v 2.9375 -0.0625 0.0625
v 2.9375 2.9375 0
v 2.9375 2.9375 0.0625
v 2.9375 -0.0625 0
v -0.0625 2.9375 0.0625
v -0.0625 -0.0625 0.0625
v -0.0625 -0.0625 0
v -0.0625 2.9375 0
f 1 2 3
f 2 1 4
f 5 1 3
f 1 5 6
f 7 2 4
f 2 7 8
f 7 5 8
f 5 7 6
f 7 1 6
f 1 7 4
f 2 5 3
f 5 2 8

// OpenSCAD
// element20.scad — straight double-speed belt tile (two blue arrows)
// Units: inches

straight   = true;
left_turn  = false;
right_turn = false;

plate_w = 2 + 7/8;
plate_d = 2 + 7/8;
plate_h = 1/16;
frame_w = 1/16;

belt_w    = 1.75;
belt_half = belt_w / 2;

hole_d = 3/32;
hole_r = hole_d / 2;

roller_count  = 13;
roller_h_size = 3/16;
roller_r      = roller_h_size / 2;
roller_inset  = plate_w / 20;
roller_x_lo   = 2 * roller_inset;
roller_x_hi   = plate_w - 2 * roller_inset;
roller_y_step = (plate_w - 2 * roller_inset) / 12;

b_L = plate_w / 2 - belt_half;
b_R = plate_w / 2 + belt_half;
nub = roller_x_hi - b_R;

arrow_w       = belt_w * 0.75;
arrow_shaft_w = arrow_w * 0.4;
arrow_head_h  = arrow_w / 2;
arrow_gap     = 1/8;
arrow_h       = (plate_d * 3/4 - arrow_gap) / 2;
arrow_shaft_h = arrow_h - arrow_head_h;
arrow_outline = 1/8;

arrow_tip_y   = 3 * plate_d / 20 + 1/4 + 7 * plate_d / 10;
arrow2_y      = arrow_tip_y - arrow_h;
arrow1_y      = arrow2_y - arrow_gap - arrow_h;

module rivet_holes() {
    spacing_x = plate_w / 10;
    spacing_y = plate_d / 10;
    inset_x   = spacing_x / 2;
    inset_y   = spacing_y / 2;
    for (i = [0:9]) {
        translate([inset_x,           inset_y + i * spacing_y, -1])
            cylinder(h = plate_h + 2, r = hole_r, $fn = 20);
        translate([plate_w - inset_x, inset_y + i * spacing_y, -1])
            cylinder(h = plate_h + 2, r = hole_r, $fn = 20);
        if (inset_x + i * spacing_x <= roller_x_lo + roller_r - hole_r ||
            inset_x + i * spacing_x >= roller_x_hi - roller_r + hole_r) {
            translate([inset_x + i * spacing_x, inset_y,           -1])
                cylinder(h = plate_h + 2, r = hole_r, $fn = 20);
            translate([inset_x + i * spacing_x, plate_d - inset_y, -1])
                cylinder(h = plate_h + 2, r = hole_r, $fn = 20);
        }
    }
}

module frame_with_id(colors = []) {
    id_cover = plate_h / 8;
    region_w = (plate_w + 2 * frame_w) / 6;
    mark_h   = plate_h - id_cover;

    color("black")
    difference() {
        translate([-frame_w, -frame_w, 0])
            cube([plate_w + 2 * frame_w, plate_d + 2 * frame_w, plate_h]);
        translate([0, 0, -0.001])
            cube([plate_w, plate_d, plate_h + 0.002]);
        translate([-frame_w, plate_d, -0.001])
            cube([plate_w + 2 * frame_w, frame_w + 0.002, plate_h + 0.002]);
    }

    for (i = [0:5]) {
        c = (colors[i] != undef) ? colors[i] : "black";
        color(c)
        translate([-frame_w + i * region_w, plate_d, 0])
            cube([region_w, frame_w, mark_h]);
        color("black")
        translate([-frame_w + i * region_w, plate_d, mark_h])
            cube([region_w, frame_w, id_cover]);
    }
}

module belt_cutout() {
    translate([(plate_w - belt_w) / 2, -0.001, -0.001])
        cube([belt_w, plate_d + 0.002, plate_h + 0.002]);
}

module roller_slots() {
    for (i = [0:roller_count - 1]) {
        cy = roller_inset + i * roller_y_step;
        translate([0, 0, -0.001])
        hull() {
            translate([roller_x_lo + roller_r, cy, 0])
                cylinder(h = plate_h + 0.002, r = roller_r, $fn = 20);
            translate([roller_x_hi - roller_r, cy, 0])
                cylinder(h = plate_h + 0.002, r = roller_r, $fn = 20);
        }
    }
}

module plate() {
    difference() {
        color("darkgray")
            cube([plate_w, plate_d, plate_h]);
        rivet_holes();
        roller_slots();
        belt_cutout();
    }
}

module rollers() {
    color("blue")
    difference() {
        for (i = [0:roller_count - 1]) {
            cy = roller_inset + i * roller_y_step;
            hull() {
                translate([roller_x_lo + roller_r, cy, 0])
                    cylinder(h = plate_h, r = roller_r, $fn = 20);
                translate([roller_x_hi - roller_r, cy, 0])
                    cylinder(h = plate_h, r = roller_r, $fn = 20);
            }
        }
        belt_cutout();
    }
}

module rivets() {
    spacing_x = plate_w / 10;
    spacing_y = plate_d / 10;
    inset_x   = spacing_x / 2;
    inset_y   = spacing_y / 2;
    color("lightgray") {
        for (i = [0:9]) {
            translate([inset_x,           inset_y + i * spacing_y, 0])
                cylinder(h = plate_h, r = hole_r, $fn = 20);
            translate([plate_w - inset_x, inset_y + i * spacing_y, 0])
                cylinder(h = plate_h, r = hole_r, $fn = 20);
            if (inset_x + i * spacing_x <= roller_x_lo + roller_r - hole_r ||
            inset_x + i * spacing_x >= roller_x_hi - roller_r + hole_r) {
                translate([inset_x + i * spacing_x, inset_y,           0])
                    cylinder(h = plate_h, r = hole_r, $fn = 20);
                translate([inset_x + i * spacing_x, plate_d - inset_y, 0])
                    cylinder(h = plate_h, r = hole_r, $fn = 20);
            }
        }
    }
}

module arrow_2d() {
    polygon([
        [-arrow_shaft_w / 2, 0],
        [ arrow_shaft_w / 2, 0],
        [ arrow_shaft_w / 2, arrow_shaft_h],
        [ arrow_w / 2,       arrow_shaft_h],
        [ 0,                 arrow_h],
        [-arrow_w / 2,       arrow_shaft_h],
        [-arrow_shaft_w / 2, arrow_shaft_h]
    ]);
}

module arrows() {
    color("blue")
    for (ay = [arrow1_y, arrow2_y])
        translate([plate_w / 2, ay, 0])
        linear_extrude(plate_h)
        difference() {
            arrow_2d();
            offset(delta = -arrow_outline) arrow_2d();
        }
}

module belt() {
    color("black")
    difference() {
        translate([(plate_w - belt_w) / 2, 0, 0])
            cube([belt_w, plate_d, plate_h]);
        for (ay = [arrow1_y, arrow2_y])
            translate([plate_w / 2, ay, -0.001])
            linear_extrude(plate_h + 0.002)
            difference() {
                arrow_2d();
                offset(delta = -arrow_outline) arrow_2d();
            }
    }
}

frame_with_id([undef, undef, "blue", "blue", undef, undef]);
plate();
rivets();
rollers();
belt();
arrows();
